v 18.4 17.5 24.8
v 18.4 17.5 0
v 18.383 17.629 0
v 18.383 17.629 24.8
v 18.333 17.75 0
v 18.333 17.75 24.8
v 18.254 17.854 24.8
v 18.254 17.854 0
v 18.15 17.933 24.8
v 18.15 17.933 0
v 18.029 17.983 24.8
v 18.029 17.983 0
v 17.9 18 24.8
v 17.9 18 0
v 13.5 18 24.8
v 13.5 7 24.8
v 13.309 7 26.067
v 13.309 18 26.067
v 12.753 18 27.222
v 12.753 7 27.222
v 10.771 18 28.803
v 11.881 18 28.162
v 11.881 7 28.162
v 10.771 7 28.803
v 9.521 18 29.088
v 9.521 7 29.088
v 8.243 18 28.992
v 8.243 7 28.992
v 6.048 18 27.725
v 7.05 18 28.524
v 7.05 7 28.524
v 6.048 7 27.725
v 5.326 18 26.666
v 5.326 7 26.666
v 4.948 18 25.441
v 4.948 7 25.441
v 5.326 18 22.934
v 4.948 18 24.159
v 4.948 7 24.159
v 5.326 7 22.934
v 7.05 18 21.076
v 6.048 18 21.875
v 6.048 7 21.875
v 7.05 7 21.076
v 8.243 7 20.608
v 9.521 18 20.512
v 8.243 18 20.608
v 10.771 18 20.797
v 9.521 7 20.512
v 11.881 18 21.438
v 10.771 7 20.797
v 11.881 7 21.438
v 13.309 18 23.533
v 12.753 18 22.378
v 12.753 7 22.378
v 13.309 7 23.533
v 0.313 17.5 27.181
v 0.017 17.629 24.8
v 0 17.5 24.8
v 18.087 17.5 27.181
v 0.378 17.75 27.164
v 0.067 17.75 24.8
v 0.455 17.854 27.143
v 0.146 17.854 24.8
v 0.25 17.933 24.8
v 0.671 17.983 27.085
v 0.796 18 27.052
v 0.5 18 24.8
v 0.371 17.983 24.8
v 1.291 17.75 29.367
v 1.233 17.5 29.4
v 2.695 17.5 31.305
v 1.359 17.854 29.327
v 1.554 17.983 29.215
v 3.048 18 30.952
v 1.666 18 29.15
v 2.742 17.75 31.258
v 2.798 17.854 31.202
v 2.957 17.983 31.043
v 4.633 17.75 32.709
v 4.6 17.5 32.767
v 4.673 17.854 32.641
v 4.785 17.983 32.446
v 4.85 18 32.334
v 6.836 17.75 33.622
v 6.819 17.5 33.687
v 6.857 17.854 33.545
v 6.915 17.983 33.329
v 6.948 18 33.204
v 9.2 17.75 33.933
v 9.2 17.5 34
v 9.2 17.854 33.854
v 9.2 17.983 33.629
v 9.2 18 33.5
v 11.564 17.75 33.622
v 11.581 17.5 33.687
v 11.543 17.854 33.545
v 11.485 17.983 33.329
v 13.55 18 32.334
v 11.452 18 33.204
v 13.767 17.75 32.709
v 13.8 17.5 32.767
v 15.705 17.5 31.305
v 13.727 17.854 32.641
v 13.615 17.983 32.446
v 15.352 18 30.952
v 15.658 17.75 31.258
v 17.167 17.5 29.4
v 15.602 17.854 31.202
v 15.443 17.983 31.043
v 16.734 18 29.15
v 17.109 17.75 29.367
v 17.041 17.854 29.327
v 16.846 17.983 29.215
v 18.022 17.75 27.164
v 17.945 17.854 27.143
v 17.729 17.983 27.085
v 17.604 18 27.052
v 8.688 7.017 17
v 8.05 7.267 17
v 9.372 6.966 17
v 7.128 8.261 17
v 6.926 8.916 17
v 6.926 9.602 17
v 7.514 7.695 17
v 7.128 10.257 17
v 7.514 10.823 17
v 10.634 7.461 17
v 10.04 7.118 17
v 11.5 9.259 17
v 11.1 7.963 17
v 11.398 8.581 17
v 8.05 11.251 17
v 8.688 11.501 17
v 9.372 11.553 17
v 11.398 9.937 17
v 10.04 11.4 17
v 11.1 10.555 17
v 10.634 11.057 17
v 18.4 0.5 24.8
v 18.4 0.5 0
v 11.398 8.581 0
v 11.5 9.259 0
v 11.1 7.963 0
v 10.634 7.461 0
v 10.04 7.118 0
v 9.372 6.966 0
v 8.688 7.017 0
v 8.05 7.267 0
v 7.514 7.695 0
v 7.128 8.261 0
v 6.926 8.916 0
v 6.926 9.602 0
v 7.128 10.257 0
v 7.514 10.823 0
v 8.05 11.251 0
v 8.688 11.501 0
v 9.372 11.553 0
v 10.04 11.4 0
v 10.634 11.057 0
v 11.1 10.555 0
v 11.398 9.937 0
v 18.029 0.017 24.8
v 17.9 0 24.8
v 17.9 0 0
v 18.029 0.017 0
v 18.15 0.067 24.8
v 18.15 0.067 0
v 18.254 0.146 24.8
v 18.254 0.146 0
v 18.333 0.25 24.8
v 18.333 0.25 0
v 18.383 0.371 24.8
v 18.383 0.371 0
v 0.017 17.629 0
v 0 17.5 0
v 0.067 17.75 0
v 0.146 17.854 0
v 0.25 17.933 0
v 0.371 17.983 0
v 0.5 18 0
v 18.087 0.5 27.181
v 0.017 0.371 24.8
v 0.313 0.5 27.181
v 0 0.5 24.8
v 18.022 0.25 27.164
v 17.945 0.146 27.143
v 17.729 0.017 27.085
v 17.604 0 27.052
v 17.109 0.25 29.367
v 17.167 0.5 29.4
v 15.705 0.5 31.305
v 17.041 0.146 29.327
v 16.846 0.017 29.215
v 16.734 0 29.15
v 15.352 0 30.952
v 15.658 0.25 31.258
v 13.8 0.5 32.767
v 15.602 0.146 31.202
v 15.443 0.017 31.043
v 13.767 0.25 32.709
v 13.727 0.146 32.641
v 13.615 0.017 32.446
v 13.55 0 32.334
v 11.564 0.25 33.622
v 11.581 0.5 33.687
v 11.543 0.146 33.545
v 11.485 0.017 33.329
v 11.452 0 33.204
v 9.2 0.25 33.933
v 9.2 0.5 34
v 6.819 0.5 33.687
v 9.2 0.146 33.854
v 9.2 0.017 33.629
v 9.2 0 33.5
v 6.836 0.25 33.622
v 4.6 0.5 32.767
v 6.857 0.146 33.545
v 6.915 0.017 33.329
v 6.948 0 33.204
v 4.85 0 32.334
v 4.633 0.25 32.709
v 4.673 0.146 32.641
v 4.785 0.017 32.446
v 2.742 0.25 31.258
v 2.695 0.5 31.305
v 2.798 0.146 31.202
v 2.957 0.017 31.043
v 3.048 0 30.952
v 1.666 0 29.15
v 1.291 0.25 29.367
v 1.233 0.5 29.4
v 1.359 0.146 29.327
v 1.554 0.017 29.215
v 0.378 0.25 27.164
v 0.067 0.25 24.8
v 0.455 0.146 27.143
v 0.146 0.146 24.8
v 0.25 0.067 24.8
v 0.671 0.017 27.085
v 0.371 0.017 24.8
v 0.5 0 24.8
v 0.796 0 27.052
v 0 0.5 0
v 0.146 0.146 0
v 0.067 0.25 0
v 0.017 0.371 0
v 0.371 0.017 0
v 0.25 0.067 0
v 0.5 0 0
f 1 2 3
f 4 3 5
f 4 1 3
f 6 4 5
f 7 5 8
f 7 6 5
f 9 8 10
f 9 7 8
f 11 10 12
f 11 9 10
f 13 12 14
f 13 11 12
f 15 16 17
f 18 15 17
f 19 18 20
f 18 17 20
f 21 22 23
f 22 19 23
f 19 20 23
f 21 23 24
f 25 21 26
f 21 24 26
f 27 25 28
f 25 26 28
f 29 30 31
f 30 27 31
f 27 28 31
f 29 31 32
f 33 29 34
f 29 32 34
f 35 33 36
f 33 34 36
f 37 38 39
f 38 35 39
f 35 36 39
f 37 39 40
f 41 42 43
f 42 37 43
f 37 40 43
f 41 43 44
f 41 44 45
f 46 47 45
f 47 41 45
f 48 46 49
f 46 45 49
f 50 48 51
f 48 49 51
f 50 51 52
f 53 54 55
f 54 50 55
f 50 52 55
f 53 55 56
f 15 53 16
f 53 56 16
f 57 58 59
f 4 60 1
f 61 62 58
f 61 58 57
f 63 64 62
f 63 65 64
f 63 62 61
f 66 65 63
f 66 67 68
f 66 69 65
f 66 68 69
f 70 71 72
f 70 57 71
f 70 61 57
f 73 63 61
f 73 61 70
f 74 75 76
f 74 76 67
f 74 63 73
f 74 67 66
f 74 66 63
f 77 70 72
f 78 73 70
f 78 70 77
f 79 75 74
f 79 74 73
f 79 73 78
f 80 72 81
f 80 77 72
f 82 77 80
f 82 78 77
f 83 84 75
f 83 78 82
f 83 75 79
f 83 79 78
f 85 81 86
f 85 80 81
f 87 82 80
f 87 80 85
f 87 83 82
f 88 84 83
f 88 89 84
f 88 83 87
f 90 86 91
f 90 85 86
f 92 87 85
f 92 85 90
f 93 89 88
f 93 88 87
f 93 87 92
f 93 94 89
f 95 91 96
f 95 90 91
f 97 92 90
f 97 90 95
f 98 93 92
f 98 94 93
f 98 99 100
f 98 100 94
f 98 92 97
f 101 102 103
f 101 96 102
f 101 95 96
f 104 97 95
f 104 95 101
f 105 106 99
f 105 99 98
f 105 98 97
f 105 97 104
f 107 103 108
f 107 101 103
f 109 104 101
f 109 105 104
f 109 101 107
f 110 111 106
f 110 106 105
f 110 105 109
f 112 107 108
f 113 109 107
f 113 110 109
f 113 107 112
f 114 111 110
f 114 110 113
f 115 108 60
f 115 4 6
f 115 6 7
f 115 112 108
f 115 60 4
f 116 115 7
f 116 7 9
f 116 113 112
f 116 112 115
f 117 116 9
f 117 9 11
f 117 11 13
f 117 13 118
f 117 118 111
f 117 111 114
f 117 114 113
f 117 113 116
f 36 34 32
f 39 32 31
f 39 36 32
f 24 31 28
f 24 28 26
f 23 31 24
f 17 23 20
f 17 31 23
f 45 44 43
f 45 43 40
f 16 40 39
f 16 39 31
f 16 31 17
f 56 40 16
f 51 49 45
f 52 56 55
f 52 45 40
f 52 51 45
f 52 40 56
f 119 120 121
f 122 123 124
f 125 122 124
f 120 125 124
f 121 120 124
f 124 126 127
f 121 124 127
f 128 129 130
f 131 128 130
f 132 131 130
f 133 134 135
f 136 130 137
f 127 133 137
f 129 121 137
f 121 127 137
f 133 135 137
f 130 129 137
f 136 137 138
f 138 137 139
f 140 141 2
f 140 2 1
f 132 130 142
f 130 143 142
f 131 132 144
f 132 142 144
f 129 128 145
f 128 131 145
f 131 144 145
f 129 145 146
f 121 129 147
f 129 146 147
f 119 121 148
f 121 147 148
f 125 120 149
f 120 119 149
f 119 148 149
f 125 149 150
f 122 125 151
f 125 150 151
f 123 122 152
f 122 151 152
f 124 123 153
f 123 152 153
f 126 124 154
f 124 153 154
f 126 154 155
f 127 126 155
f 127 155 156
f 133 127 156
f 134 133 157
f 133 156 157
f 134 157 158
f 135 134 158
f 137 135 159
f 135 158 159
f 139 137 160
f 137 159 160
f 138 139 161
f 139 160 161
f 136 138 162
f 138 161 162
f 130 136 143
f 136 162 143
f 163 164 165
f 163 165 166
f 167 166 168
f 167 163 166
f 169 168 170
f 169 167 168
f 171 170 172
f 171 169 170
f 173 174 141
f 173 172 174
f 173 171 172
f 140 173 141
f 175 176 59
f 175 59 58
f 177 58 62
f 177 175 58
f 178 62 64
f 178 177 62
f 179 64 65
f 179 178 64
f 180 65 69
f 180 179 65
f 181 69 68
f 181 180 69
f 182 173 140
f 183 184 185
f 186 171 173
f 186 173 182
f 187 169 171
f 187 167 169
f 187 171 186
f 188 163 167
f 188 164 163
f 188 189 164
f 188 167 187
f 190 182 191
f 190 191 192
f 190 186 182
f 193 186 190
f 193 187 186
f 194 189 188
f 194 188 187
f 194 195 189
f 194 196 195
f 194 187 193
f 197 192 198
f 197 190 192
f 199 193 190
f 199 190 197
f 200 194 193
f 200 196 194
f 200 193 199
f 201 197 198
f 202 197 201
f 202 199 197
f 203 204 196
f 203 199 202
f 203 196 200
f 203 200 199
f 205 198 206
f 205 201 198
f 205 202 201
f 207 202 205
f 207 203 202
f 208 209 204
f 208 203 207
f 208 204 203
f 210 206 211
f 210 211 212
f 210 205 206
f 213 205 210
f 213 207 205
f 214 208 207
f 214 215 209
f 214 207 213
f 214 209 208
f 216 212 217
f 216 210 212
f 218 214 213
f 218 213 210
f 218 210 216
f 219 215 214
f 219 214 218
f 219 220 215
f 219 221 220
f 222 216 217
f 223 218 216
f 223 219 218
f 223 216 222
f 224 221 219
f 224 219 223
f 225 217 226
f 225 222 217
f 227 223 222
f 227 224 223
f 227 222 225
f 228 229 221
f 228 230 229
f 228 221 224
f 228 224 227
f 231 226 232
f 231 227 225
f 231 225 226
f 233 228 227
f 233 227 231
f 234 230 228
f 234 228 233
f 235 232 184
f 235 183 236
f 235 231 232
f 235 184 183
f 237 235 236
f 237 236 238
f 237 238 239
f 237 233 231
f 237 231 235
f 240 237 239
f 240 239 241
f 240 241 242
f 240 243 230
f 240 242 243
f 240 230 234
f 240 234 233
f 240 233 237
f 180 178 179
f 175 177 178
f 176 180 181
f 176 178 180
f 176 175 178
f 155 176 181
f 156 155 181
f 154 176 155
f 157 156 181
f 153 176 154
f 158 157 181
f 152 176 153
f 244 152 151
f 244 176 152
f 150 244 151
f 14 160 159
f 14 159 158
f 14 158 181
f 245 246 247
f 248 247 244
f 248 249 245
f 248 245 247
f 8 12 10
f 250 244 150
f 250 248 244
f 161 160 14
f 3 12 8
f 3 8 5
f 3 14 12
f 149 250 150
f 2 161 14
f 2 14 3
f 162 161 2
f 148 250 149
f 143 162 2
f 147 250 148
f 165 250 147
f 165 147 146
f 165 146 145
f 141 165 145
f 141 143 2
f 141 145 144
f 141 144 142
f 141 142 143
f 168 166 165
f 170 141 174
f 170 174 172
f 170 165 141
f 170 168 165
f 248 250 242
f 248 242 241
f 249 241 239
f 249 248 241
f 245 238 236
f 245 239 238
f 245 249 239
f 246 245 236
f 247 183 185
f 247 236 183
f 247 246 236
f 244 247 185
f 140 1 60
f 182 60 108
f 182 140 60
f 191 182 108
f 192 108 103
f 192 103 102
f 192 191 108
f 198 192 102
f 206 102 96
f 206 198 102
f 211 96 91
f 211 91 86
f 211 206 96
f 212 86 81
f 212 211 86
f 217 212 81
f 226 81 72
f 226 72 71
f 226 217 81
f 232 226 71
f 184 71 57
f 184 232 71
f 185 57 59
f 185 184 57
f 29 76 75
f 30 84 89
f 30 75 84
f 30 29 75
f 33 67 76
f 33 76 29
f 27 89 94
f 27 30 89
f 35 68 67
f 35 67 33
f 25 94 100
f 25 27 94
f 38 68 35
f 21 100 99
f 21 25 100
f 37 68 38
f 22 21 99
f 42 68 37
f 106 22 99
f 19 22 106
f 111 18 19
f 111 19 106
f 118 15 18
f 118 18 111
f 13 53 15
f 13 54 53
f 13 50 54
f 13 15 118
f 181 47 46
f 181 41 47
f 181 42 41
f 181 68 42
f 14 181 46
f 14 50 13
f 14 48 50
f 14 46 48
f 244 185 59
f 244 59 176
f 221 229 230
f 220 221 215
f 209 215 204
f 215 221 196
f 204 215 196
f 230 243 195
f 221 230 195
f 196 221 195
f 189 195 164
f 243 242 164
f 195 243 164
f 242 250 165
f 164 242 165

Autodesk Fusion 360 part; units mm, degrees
sketch "Sketch1" plane through (0, 0, 0) normal (0, 1, 0) x (1, 0, 0)
  line L0 (0, 0) -> (18.4, 0)
  line L1 (18.4, 0) -> (18.4, -34)
  line L2 (18.4, -34) -> (0, -34)
  line L3 (0, -34) -> (0, 0)
  circle A0 centre (9.2, -24.8) radius 9.2
  circle A1 centre (9.2, -24.8) radius 4.3
  dimension "d1" = 18.4
  dimension "d2" = 34
  dimension "d3" = 4.9
extrude "Extrude2" add sketch "Sketch1" along normal blind 18 contours L0 L1 L3 A0 | A0
fillet "Fillet1" radius 0.5 6 edges at (18.4, 0, 12.4) (9.2, 0, 34) (0, 0, 12.4) (0, 18, 12.4) (9.2, 18, 34) (18.4, 18, 12.4)
sketch "Sketch2" plane through (0, 0, 0) normal (0, 0, 1) x (1, 0, 0)
  line L0 (18.4, 0.5) -> (18.4, 17.5)
sketch "Sketch3" plane through (0, 0, 0) normal (0, 0, 1) x (1, 0, 0)
  circle A0 centre (9.2, 9.2591) radius 2.3
  dimension "d9" = 4.6
extrude "Extrude3" cut sketch "Sketch3" along normal blind 17
extrude "Extrude4" add sketch "Sketch1" along normal blind 7 contours A1
